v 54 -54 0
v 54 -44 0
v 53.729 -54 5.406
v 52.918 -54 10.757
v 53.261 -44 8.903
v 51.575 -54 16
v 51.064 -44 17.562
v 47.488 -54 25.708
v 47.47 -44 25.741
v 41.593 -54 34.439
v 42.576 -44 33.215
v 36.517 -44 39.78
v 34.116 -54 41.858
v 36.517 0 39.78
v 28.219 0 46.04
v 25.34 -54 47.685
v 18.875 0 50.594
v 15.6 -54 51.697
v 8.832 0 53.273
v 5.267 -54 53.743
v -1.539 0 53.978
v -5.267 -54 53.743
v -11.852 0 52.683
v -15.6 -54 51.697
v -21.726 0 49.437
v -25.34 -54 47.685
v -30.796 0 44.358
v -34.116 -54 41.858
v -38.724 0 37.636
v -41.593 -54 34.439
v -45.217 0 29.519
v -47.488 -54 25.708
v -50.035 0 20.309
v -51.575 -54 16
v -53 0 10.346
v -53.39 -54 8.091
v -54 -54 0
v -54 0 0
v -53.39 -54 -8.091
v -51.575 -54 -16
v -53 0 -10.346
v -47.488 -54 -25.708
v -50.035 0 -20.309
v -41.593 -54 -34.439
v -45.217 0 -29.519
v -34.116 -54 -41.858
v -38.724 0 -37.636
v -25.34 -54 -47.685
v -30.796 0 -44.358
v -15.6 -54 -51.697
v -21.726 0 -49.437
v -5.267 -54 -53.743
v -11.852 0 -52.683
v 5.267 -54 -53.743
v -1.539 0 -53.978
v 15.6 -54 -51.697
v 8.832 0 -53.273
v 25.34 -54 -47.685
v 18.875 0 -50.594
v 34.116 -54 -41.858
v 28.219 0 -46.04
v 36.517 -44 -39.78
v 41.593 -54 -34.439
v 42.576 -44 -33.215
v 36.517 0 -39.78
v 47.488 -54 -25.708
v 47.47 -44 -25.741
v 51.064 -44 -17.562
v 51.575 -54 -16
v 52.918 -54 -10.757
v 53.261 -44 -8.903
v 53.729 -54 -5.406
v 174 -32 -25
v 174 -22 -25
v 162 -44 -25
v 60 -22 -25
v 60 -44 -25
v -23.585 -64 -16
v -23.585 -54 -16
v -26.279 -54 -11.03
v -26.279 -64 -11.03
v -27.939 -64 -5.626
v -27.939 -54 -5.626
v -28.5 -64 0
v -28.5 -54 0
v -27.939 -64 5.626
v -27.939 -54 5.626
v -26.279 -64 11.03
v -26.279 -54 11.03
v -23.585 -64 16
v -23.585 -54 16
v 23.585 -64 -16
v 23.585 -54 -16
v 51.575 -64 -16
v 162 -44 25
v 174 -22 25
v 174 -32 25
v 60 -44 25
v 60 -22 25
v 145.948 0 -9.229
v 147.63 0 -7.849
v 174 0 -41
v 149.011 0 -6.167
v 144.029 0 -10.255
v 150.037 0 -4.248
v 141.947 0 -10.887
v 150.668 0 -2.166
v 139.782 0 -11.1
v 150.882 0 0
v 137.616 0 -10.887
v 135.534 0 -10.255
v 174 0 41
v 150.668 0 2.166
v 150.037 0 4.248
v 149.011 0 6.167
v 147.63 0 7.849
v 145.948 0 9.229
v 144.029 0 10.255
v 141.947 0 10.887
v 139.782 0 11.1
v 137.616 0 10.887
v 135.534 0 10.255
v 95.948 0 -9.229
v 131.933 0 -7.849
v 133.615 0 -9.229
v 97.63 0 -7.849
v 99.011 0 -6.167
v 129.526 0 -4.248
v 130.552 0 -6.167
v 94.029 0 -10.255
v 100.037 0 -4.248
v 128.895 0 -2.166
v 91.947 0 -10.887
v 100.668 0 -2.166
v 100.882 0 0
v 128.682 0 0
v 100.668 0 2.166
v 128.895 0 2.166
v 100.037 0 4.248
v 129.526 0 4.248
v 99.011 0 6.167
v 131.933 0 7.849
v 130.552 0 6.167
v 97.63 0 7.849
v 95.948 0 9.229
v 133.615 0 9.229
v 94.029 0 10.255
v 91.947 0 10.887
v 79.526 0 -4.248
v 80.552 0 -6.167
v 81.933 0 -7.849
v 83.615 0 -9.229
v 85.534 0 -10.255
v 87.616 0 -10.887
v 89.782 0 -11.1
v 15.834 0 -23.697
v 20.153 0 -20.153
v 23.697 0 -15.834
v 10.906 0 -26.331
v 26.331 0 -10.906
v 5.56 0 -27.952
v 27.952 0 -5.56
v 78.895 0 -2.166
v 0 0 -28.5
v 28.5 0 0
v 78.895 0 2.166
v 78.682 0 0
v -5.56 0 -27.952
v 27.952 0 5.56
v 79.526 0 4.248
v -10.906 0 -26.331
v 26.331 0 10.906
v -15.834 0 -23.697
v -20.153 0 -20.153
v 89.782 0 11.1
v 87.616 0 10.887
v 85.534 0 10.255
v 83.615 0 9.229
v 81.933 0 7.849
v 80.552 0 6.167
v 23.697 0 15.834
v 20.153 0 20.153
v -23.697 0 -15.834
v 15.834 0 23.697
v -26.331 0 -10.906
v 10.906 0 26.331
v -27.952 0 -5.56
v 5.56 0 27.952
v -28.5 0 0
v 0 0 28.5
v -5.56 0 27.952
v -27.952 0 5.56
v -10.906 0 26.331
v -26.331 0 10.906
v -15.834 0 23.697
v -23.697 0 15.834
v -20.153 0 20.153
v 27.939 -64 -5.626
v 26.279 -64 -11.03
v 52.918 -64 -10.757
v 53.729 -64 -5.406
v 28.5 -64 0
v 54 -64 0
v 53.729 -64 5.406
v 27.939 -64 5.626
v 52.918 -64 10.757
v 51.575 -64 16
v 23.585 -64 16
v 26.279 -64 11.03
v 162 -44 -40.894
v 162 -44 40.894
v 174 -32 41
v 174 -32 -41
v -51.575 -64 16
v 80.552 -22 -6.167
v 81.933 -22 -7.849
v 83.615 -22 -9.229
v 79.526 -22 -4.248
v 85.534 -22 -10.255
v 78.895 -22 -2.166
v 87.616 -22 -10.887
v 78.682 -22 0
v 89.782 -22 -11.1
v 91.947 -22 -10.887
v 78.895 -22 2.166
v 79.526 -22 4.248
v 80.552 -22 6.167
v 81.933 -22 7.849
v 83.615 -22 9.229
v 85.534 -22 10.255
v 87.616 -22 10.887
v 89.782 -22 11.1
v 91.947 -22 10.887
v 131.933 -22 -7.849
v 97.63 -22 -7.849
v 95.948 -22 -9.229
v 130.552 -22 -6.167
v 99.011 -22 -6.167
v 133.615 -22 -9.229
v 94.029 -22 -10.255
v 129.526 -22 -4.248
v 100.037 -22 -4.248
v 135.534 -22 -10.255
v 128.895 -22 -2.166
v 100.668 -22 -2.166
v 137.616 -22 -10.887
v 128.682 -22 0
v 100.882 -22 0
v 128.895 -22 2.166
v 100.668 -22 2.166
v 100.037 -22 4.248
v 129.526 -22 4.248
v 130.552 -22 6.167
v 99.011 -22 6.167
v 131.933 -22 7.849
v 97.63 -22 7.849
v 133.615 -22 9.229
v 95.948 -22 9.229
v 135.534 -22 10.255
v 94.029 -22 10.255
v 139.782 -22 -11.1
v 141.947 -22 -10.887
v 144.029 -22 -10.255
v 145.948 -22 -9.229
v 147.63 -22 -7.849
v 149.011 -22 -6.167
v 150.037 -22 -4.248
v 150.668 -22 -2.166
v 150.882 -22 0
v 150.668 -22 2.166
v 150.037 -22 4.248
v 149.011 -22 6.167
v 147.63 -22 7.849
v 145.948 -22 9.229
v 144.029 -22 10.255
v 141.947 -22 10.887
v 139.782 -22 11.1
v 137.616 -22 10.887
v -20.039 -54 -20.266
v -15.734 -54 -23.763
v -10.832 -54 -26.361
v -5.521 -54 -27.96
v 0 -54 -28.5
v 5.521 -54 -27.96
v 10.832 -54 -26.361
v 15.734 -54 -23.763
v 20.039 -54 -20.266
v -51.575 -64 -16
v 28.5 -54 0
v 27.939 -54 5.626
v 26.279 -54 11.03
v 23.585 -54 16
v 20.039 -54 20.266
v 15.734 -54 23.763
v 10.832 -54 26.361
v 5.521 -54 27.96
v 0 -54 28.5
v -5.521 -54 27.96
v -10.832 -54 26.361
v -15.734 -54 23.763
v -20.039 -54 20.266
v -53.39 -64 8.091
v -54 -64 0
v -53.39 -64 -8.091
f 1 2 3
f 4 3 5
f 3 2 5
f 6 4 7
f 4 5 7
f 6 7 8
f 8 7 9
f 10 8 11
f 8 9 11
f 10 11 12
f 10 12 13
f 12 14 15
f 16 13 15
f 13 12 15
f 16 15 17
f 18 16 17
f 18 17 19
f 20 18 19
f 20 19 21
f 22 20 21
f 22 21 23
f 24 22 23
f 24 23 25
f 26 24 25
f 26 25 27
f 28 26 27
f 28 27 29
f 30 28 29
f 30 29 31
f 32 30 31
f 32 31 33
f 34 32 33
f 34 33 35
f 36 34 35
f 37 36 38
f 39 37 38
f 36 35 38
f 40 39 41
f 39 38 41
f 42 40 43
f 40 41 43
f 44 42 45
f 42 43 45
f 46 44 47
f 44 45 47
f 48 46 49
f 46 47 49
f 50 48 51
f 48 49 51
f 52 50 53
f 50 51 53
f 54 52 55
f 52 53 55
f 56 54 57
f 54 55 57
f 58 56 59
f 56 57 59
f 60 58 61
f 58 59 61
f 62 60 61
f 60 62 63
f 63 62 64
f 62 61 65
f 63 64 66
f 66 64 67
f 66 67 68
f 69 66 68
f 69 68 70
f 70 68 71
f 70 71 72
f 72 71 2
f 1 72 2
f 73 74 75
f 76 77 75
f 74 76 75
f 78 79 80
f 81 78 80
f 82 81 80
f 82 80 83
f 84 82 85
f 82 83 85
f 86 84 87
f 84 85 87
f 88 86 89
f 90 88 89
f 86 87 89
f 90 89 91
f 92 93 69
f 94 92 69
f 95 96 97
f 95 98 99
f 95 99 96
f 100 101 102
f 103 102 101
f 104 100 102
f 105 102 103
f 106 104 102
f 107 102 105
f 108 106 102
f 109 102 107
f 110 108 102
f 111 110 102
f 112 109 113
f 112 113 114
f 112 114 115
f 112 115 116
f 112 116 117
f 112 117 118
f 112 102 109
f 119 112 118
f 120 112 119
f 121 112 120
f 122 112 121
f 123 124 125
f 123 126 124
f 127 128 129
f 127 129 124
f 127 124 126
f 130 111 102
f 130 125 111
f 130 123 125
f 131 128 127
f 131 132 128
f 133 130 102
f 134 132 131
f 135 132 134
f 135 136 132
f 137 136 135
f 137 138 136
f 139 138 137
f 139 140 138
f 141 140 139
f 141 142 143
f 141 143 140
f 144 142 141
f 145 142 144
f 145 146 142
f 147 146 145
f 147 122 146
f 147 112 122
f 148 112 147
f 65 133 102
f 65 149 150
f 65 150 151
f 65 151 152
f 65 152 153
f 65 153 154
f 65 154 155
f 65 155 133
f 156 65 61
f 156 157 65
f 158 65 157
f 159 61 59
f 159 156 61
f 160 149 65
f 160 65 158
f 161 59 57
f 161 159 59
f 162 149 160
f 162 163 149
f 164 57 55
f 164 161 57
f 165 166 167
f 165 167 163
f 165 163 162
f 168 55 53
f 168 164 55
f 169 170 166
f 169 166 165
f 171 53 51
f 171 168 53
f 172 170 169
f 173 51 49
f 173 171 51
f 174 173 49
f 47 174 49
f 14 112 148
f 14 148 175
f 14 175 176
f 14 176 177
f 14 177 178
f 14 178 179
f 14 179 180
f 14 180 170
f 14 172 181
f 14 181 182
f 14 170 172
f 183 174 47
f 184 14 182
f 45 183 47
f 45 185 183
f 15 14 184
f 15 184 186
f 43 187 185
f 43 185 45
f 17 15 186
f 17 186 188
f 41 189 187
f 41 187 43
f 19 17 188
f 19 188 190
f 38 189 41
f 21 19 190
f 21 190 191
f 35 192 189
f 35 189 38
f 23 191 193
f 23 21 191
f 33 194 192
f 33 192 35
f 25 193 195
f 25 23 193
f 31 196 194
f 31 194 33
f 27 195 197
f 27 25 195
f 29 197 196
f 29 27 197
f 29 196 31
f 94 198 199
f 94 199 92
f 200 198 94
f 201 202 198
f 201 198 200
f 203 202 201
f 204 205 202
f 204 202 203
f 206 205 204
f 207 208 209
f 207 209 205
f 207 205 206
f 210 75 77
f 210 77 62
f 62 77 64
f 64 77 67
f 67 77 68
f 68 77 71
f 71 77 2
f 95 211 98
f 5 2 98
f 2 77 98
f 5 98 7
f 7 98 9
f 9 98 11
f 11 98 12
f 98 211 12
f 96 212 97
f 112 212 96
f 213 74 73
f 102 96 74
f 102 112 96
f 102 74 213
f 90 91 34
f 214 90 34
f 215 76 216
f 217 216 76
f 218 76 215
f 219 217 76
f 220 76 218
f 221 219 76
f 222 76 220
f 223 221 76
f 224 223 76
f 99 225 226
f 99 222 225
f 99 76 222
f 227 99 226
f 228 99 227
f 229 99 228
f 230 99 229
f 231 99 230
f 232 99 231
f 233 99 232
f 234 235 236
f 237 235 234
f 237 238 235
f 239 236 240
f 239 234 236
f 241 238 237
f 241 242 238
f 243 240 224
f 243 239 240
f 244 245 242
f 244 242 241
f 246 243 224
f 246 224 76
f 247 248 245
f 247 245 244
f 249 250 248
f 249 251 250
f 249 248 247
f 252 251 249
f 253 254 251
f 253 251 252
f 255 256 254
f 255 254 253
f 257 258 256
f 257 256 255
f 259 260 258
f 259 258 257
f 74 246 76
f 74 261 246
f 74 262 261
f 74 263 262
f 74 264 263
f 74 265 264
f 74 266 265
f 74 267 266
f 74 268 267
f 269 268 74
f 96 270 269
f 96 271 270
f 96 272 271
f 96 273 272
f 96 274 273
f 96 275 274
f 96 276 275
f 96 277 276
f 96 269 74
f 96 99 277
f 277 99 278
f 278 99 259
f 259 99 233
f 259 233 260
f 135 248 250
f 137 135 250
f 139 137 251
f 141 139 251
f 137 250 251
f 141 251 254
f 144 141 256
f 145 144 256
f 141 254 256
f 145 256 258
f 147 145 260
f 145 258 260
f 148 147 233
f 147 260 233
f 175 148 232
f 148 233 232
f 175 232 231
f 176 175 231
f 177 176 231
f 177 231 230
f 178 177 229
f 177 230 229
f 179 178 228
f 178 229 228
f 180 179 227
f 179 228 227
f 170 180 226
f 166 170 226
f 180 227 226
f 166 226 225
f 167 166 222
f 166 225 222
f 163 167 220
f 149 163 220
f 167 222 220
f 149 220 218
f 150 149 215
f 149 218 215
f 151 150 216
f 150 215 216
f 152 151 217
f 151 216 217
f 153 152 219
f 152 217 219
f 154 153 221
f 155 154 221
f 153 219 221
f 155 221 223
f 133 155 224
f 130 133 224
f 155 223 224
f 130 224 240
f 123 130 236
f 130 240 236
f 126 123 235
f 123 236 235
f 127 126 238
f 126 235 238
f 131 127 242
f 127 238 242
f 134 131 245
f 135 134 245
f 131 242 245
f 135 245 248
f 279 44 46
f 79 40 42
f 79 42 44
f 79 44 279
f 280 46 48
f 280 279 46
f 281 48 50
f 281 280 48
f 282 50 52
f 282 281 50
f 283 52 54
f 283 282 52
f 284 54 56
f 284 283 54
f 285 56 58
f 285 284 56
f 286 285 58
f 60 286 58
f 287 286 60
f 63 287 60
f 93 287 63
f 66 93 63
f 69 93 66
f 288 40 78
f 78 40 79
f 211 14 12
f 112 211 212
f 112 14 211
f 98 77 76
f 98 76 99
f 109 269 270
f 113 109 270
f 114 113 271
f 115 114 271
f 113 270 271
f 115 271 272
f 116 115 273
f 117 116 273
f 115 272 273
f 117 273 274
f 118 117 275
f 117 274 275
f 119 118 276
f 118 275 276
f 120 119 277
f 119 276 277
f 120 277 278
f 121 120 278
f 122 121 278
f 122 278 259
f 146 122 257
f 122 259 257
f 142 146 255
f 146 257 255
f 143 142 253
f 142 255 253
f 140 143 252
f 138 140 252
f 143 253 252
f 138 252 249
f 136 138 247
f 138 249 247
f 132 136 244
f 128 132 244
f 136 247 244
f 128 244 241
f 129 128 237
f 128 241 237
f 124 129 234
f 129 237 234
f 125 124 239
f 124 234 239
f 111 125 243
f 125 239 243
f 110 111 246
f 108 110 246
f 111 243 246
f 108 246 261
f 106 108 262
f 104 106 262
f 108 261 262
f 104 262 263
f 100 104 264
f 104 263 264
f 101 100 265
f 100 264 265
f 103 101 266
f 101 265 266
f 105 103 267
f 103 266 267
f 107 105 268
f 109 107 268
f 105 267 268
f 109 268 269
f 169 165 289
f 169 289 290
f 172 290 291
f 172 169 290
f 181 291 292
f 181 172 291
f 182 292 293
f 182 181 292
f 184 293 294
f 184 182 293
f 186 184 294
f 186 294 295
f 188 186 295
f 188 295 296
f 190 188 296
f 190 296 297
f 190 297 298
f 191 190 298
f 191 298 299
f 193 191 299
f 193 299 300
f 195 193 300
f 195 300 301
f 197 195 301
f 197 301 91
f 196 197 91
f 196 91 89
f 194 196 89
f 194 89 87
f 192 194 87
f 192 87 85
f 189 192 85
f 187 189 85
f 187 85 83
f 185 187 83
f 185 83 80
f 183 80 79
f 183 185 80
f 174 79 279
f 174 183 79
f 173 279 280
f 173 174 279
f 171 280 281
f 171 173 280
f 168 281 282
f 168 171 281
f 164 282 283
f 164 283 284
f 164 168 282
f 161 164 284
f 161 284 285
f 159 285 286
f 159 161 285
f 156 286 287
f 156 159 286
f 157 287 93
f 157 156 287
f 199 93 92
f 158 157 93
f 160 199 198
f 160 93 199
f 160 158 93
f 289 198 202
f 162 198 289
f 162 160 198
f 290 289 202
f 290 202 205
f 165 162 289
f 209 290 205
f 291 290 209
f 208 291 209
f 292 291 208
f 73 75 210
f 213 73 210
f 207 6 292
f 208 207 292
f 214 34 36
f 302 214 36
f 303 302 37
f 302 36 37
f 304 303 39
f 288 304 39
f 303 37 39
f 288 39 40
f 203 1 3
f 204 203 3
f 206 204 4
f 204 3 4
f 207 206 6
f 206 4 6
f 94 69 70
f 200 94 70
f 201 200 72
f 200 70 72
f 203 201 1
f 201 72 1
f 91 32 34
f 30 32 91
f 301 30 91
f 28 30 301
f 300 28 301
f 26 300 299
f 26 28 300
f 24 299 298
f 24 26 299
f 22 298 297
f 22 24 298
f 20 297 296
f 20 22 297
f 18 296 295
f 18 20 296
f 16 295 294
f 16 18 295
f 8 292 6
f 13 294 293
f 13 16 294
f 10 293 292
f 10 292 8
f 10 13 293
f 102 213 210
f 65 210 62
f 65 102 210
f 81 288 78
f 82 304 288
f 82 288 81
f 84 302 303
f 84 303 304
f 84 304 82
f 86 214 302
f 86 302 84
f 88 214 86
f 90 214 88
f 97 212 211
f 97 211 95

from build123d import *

# Parameters (mm, degrees)
F0_R      = 54
F0_R_2    = 28.5
F1_DEPTH  = 54
F3_DEPTH  = 10
F5_DEPTH  = 44
F6_W      = 114
F6_H      = 50
F7_DEPTH  = 22
F8_SIZE   = 12
F9_R      = 11.1
F10_DEPTH = 22


# Not quite as in the source:
# - after a boolean that leaves OpenCascade's solid faulty, fix() repairs it


with BuildPart() as f1:
    # F0 (on Front) → F1 (new body)
    with BuildSketch(Plane.XZ):
        Circle(F0_R)
        Circle(F0_R_2, mode=Mode.SUBTRACT)
    extrude(amount=F1_DEPTH)

    # F2 (on face) → F3 (join)
    with BuildSketch(Plane.XZ.offset(54)):
        with BuildLine():
            Line((-23.5849528301, 16), (-51.5751878329, 16))
            ThreePointArc((-51.5751878329, 16), (-54, 0), (-51.5751878329, -16))
            Line((-51.5751878329, -16), (-23.5849528301, -16))
            ThreePointArc((-23.5849528301, -16), (-28.5, 0), (-23.5849528301, 16))
        make_face()
        with BuildLine():
            ThreePointArc((51.5751878329, -16), (53.3903556037, -8.0913489921), (54, 0))
            ThreePointArc((54, 0), (53.3903556037, 8.0913489921), (51.5751878329, 16))
            Line((51.5751878329, 16), (23.5849528301, 16))
            ThreePointArc((23.5849528301, 16), (27.2435419472, 8.368955859), (28.5, 0))
            ThreePointArc((28.5, 0), (27.2435419472, -8.368955859), (23.5849528301, -16))
            Line((23.5849528301, -16), (51.5751878329, -16))
        make_face()
    extrude(amount=F3_DEPTH)

    add(f1.part.fix(), mode=Mode.REPLACE)

    # F4 (on face) → F5 (join)
    with BuildSketch(Plane(origin=(0, 0, 0), x_dir=(-1, 0, 0), z_dir=(0, 1, 0))):
        with BuildLine():
            Line((-174, 41), (-174, 0))
            Line((-174, 0), (-174, -41))
            Line((-174, -41), (-36.5173199288, -39.7804643666))
            ThreePointArc((-36.5173199288, -39.7804643666), (-54, 0), (-36.5173199288, 39.7804643666))
            Line((-36.5173199288, 39.7804643666), (-174, 41))
        make_face()
    extrude(amount=-F5_DEPTH)

    # F6 (on face) → F7 (cut)
    with BuildSketch(Plane.XZ.offset(44)):
        with Locations((117, 0)):
            Rectangle(F6_W, F6_H)
    extrude(amount=-F7_DEPTH, mode=Mode.SUBTRACT)

    # F8
    f8_edges = [f1.edges().sort_by_distance(p)[0] for p in [
        (174, -44, 33),
        (174, -44, -33),
    ]]
    chamfer(f8_edges, length=F8_SIZE)

    # F9 (on face) → F10 (cut, through all)
    with BuildSketch(Plane.XZ.offset(22)):
        with Locations((139.781537652, 0)):
            Circle(F9_R)
        with Locations((89.781537652, 0)):
            Circle(F9_R)
    extrude(amount=-F10_DEPTH, mode=Mode.SUBTRACT)


solid = f1.part
